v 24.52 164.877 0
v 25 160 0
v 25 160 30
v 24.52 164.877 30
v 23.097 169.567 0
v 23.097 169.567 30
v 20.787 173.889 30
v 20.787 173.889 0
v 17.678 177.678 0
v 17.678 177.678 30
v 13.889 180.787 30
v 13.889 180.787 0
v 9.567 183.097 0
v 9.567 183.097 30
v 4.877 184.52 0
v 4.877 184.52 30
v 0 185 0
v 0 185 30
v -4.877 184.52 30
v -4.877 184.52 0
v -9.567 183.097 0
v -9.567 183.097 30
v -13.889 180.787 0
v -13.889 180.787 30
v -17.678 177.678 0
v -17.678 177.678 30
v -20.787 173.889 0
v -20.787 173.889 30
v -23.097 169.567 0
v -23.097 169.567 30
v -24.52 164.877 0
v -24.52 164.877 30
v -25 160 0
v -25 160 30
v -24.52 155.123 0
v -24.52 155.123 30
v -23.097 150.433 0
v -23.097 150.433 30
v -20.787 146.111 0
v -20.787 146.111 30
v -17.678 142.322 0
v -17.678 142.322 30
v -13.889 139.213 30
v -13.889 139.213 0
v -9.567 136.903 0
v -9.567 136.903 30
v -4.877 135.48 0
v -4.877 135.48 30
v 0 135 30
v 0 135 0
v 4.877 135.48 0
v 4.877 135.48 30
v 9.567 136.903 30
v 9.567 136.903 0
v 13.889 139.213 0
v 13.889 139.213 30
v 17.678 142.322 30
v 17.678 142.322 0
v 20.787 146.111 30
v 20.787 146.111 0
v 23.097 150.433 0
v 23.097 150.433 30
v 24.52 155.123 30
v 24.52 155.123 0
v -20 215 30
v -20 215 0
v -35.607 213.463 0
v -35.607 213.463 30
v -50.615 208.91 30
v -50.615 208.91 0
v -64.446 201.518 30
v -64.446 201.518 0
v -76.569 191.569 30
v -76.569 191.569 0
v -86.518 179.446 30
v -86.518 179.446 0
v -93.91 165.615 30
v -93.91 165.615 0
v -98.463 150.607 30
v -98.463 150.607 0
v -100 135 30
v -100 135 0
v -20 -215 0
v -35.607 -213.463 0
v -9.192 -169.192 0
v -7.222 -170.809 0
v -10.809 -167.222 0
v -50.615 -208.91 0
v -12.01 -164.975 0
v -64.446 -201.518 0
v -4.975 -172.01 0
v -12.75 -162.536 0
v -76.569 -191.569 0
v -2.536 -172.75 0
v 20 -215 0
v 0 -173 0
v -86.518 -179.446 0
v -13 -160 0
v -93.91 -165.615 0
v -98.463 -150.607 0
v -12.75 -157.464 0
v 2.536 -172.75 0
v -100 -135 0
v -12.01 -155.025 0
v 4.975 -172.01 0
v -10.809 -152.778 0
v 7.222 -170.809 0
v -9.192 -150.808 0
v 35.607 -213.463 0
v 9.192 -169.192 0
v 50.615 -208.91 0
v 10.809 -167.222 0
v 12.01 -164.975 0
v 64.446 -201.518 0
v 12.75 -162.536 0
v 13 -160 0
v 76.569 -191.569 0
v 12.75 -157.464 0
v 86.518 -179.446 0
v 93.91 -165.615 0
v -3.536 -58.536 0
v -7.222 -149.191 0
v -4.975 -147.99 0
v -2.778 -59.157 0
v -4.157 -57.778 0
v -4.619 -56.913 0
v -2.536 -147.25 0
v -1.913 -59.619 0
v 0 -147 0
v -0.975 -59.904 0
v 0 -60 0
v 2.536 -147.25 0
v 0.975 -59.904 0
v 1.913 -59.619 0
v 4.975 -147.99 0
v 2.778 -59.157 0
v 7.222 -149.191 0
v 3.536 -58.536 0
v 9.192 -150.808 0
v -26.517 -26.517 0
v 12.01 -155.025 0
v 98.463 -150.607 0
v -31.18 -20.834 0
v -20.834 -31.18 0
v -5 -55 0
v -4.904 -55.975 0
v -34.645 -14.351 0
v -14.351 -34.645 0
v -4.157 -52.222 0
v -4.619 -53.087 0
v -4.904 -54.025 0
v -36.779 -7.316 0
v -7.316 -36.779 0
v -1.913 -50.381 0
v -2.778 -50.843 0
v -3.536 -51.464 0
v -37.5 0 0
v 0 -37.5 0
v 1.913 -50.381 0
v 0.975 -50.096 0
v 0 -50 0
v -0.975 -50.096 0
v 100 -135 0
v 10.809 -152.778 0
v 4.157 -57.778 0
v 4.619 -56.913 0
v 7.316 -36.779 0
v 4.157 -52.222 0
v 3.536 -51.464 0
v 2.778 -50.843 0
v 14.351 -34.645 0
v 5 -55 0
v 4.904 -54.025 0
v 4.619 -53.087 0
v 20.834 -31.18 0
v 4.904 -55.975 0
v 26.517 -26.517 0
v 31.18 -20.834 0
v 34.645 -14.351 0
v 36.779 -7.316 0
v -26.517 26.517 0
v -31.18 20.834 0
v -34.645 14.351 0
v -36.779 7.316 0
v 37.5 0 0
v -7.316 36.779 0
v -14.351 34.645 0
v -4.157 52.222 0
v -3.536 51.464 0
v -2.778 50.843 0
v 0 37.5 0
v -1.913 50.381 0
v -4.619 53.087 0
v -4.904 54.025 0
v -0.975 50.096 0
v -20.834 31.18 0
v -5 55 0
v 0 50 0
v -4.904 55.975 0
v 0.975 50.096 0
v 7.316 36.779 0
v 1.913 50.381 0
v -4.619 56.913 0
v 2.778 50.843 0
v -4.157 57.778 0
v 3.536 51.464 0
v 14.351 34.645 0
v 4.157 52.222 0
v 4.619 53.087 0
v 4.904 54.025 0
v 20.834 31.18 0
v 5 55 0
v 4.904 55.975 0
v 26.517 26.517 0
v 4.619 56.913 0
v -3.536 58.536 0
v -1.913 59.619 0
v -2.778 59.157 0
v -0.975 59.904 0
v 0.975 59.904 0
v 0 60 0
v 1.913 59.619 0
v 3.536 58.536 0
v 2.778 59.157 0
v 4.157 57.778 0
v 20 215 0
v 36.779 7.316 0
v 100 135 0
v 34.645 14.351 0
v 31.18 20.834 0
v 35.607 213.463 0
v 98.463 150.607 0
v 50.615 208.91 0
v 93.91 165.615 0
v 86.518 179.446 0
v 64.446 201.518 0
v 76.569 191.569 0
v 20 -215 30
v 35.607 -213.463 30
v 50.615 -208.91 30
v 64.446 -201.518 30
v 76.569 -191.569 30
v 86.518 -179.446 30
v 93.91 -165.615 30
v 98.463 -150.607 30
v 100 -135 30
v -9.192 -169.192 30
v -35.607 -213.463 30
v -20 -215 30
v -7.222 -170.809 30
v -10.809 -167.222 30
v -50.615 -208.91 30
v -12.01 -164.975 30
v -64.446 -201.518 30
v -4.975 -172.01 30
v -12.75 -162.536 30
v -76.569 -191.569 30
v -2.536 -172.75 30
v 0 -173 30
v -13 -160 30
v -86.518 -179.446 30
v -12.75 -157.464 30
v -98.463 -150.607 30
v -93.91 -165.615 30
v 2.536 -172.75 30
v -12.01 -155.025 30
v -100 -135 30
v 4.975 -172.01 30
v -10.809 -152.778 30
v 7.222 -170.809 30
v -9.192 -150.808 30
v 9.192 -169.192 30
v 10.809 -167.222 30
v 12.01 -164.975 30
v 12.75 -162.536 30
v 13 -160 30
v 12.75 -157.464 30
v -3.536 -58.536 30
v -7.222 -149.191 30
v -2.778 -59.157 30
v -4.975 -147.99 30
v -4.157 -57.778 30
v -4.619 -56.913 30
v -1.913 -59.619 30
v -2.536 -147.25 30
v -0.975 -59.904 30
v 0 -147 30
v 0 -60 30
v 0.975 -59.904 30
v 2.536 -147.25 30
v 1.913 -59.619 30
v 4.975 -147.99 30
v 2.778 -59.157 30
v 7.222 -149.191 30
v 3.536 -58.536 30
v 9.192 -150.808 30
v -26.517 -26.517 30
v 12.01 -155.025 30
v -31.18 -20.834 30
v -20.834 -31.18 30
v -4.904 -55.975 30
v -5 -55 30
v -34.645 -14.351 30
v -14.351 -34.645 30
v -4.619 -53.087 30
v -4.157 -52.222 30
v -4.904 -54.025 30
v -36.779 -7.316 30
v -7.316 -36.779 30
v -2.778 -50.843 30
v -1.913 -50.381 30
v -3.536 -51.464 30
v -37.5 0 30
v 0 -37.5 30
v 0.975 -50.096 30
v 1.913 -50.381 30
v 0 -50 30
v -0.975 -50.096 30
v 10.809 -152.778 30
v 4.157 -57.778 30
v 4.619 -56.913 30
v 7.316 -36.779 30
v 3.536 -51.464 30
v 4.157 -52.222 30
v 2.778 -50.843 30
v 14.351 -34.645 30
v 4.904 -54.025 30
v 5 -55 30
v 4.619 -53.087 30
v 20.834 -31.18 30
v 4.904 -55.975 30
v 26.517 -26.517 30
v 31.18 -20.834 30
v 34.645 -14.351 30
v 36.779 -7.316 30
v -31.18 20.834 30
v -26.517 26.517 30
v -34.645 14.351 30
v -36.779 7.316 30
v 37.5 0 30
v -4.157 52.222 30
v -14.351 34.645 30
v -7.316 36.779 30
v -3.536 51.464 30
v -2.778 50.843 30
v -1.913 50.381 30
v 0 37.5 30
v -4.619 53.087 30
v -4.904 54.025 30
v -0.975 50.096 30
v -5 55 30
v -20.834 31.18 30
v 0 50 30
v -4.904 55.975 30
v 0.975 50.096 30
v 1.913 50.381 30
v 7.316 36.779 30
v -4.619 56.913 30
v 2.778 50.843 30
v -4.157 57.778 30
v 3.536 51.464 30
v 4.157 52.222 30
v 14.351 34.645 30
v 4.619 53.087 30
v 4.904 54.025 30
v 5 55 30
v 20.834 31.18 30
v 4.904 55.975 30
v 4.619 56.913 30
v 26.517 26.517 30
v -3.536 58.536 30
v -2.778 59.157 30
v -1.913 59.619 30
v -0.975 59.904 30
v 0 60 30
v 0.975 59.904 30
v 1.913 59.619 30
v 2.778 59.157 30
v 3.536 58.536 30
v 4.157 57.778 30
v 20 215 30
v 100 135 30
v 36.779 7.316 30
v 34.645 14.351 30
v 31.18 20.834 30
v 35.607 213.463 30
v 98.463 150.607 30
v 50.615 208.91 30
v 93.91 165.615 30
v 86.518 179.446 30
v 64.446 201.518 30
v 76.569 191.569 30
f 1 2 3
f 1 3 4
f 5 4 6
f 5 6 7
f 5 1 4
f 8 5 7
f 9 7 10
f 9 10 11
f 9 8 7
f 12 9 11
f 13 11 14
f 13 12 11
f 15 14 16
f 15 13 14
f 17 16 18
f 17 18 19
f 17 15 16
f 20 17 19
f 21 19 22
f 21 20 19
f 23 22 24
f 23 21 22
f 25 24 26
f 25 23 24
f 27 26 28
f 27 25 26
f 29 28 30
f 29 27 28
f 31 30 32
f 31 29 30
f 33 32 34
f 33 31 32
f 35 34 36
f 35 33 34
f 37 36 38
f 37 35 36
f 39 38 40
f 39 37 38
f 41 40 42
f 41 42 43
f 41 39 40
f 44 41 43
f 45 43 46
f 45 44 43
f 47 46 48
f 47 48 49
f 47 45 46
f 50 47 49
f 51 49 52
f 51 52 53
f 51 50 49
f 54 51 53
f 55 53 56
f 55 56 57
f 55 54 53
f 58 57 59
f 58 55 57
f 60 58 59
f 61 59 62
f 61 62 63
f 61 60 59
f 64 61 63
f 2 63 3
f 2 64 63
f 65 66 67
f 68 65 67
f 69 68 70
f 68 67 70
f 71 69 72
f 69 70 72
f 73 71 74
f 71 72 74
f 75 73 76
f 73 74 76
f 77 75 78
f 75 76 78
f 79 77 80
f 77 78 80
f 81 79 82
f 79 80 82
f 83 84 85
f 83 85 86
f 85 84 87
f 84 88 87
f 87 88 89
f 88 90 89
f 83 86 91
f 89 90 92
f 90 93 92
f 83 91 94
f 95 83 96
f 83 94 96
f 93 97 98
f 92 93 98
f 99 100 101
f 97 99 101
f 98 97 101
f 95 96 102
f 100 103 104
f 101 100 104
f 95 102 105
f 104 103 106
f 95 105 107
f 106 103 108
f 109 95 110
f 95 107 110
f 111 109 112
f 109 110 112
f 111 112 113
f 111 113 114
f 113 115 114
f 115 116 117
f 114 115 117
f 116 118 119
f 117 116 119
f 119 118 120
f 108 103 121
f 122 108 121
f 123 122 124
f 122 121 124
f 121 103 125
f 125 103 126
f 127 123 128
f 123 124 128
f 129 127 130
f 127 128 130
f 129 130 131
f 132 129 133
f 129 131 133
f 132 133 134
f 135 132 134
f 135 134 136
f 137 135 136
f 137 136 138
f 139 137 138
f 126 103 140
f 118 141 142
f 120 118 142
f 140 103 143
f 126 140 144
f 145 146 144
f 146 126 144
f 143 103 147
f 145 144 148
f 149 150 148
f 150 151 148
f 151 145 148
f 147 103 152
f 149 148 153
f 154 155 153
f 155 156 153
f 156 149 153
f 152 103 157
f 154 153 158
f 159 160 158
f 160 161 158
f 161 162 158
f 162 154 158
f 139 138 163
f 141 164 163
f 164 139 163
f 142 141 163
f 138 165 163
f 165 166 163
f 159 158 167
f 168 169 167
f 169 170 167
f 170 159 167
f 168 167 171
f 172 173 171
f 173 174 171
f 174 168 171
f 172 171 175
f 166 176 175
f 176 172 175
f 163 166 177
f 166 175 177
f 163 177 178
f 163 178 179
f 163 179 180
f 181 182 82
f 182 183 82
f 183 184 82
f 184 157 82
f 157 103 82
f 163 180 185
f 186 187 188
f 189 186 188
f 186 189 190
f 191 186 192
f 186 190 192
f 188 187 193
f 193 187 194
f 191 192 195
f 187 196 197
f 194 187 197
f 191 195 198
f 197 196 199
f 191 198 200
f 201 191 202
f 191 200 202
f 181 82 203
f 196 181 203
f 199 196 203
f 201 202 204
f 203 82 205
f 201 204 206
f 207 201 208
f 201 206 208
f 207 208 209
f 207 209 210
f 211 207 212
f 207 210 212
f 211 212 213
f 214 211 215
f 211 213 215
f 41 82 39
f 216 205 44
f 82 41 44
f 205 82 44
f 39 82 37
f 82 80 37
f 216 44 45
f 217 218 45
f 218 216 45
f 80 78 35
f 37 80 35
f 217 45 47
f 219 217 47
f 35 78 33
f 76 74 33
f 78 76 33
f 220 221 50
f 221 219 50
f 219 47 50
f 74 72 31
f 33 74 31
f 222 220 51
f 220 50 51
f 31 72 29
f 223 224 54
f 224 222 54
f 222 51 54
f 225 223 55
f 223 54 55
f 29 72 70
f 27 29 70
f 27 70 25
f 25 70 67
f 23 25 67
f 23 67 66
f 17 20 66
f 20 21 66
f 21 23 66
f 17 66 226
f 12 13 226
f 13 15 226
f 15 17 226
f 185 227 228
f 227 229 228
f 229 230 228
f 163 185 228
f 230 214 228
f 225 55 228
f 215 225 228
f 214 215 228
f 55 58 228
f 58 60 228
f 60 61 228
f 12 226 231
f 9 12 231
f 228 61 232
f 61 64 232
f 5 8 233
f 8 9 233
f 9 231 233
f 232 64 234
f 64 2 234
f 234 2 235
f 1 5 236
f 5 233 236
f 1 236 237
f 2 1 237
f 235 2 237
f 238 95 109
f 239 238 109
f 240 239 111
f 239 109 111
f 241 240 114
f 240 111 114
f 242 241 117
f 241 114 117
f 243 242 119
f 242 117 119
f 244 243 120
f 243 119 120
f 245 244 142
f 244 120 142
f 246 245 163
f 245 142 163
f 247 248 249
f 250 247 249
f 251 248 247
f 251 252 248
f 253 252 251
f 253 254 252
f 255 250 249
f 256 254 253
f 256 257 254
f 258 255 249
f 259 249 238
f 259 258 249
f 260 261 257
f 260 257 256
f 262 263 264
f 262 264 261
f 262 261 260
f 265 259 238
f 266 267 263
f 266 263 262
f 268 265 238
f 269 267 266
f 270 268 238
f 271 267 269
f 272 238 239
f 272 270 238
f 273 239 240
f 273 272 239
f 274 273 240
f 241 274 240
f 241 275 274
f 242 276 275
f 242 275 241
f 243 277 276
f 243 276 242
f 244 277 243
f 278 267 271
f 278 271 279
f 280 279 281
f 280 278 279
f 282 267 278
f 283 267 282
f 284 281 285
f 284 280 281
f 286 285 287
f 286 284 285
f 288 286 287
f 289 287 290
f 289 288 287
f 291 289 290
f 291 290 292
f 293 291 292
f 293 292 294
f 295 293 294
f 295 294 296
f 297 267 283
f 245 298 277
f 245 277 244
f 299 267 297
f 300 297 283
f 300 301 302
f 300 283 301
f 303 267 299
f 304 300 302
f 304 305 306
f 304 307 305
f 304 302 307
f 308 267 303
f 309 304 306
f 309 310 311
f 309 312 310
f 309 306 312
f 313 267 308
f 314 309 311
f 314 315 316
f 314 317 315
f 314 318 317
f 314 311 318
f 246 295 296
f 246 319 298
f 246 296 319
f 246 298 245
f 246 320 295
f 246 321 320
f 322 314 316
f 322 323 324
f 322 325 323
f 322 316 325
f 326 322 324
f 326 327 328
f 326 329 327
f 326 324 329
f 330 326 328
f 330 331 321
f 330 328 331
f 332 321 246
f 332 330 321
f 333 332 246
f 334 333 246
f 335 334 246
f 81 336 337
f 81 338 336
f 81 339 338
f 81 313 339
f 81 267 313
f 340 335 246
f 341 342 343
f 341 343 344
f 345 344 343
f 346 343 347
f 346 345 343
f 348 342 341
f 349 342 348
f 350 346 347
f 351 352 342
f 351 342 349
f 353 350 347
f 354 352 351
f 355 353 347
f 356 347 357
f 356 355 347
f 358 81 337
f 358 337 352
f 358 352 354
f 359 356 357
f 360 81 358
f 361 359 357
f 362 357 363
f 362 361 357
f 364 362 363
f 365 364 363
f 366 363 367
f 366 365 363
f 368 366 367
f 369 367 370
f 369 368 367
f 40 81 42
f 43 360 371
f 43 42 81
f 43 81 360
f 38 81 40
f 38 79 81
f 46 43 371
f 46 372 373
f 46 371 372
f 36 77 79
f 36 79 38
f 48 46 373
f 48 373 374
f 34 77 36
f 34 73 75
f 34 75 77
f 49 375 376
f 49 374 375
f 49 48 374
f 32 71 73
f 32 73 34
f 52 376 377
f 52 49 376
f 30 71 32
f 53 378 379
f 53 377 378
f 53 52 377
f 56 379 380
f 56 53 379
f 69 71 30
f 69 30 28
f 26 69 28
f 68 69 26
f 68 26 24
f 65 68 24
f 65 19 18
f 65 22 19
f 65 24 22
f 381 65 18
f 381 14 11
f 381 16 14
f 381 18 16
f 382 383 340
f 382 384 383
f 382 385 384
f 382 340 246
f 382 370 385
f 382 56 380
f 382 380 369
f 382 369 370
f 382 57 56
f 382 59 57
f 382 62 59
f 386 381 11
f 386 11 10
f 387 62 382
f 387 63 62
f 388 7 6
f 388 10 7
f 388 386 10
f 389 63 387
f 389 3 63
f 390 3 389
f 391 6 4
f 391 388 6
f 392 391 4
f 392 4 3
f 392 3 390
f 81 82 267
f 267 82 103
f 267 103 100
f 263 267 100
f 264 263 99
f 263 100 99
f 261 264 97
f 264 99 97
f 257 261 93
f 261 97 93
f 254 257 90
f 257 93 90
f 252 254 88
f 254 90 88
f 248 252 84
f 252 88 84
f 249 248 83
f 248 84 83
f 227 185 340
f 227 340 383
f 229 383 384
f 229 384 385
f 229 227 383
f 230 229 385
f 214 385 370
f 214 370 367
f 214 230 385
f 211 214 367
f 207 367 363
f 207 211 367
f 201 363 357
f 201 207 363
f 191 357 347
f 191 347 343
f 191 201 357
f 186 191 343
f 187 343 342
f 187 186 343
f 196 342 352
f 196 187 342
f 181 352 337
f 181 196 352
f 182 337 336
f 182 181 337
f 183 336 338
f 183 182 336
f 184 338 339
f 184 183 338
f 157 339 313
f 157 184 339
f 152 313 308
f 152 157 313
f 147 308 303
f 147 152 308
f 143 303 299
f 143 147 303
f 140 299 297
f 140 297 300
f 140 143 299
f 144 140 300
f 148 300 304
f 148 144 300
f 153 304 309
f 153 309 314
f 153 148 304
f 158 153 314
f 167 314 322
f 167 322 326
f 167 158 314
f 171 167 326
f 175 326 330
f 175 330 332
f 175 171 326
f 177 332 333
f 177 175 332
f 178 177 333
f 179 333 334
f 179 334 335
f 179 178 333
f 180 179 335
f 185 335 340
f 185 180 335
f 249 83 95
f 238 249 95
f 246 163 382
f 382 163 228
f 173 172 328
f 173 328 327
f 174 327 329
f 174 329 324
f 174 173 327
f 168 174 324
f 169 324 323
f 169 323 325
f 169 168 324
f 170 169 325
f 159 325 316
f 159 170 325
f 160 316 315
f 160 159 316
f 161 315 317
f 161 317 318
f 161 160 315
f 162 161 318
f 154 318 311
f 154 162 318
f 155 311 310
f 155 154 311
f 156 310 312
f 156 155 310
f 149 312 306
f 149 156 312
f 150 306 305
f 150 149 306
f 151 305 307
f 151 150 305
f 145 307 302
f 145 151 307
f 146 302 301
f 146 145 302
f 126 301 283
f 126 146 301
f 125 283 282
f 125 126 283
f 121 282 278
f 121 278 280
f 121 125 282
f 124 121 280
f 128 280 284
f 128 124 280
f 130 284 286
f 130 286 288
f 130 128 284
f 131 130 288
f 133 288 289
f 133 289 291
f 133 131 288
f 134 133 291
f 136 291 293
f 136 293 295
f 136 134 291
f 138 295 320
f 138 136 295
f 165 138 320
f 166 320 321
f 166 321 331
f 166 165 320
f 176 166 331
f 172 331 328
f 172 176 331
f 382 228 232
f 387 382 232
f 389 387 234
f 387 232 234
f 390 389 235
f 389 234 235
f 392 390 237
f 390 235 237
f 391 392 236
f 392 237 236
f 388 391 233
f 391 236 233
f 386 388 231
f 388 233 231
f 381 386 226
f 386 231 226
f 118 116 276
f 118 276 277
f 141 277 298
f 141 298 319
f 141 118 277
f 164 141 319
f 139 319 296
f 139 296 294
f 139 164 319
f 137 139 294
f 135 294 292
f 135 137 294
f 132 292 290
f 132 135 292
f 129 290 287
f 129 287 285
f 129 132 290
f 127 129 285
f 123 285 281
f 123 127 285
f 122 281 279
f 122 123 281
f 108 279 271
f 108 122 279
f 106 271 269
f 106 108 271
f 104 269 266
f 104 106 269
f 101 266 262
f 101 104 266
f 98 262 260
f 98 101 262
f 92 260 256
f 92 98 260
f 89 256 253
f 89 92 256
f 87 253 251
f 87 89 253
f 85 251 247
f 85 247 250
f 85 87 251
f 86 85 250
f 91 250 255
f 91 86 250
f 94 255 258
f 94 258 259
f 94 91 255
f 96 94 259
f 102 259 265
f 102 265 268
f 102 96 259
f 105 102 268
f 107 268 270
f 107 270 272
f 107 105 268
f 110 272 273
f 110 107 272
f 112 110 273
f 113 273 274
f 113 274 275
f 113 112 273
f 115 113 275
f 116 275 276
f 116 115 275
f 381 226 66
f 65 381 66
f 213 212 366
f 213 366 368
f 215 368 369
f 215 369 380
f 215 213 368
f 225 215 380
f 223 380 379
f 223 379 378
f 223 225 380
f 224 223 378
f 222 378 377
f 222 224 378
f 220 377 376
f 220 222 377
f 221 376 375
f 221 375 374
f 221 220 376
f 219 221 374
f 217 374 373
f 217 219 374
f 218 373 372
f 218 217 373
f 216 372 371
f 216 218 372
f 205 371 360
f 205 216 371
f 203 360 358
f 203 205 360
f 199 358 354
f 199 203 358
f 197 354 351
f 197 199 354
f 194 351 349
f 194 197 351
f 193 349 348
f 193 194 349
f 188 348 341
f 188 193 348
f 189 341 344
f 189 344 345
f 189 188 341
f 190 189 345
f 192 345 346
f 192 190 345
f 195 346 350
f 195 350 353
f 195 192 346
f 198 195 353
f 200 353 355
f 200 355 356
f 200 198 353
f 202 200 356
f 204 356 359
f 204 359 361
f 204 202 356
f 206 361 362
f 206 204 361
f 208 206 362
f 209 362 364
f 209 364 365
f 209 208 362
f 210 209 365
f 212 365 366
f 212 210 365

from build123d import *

# Parameters (mm, degrees)
SCHIZZO2_R    = 37.5
SCHIZZO2_R_2  = 13
SCHIZZO2_R_3  = 25
SCHIZZO2_R_4  = 5
PIASTRA_DEPTH = 30


with BuildPart() as part:
    # Schizzo2 → Piastra (new body)
    with BuildSketch(Plane.XY):
        with BuildLine():
            Line((20, 215), (-20, 215))
            ThreePointArc((-20, 215), (-76.568542495, 191.568542495), (-100, 135))
            Line((-100, 135), (-100, -135))
            ThreePointArc((-100, -135), (-76.568542495, -191.568542495), (-20, -215))
            Line((-20, -215), (20, -215))
            ThreePointArc((20, -215), (76.568542495, -191.568542495), (100, -135))
            Line((100, -135), (100, 135))
            ThreePointArc((100, 135), (76.568542495, 191.568542495), (20, 215))
        make_face()
        Circle(SCHIZZO2_R, mode=Mode.SUBTRACT)
        with Locations((0, -160)):
            Circle(SCHIZZO2_R_2, mode=Mode.SUBTRACT)
        with Locations((0, 160)):
            Circle(SCHIZZO2_R_3, mode=Mode.SUBTRACT)
        with Locations((0, 55)):
            Circle(SCHIZZO2_R_4, mode=Mode.SUBTRACT)
        with Locations((0, -55)):
            Circle(SCHIZZO2_R_4, mode=Mode.SUBTRACT)
    extrude(amount=PIASTRA_DEPTH)


solid = part.part
